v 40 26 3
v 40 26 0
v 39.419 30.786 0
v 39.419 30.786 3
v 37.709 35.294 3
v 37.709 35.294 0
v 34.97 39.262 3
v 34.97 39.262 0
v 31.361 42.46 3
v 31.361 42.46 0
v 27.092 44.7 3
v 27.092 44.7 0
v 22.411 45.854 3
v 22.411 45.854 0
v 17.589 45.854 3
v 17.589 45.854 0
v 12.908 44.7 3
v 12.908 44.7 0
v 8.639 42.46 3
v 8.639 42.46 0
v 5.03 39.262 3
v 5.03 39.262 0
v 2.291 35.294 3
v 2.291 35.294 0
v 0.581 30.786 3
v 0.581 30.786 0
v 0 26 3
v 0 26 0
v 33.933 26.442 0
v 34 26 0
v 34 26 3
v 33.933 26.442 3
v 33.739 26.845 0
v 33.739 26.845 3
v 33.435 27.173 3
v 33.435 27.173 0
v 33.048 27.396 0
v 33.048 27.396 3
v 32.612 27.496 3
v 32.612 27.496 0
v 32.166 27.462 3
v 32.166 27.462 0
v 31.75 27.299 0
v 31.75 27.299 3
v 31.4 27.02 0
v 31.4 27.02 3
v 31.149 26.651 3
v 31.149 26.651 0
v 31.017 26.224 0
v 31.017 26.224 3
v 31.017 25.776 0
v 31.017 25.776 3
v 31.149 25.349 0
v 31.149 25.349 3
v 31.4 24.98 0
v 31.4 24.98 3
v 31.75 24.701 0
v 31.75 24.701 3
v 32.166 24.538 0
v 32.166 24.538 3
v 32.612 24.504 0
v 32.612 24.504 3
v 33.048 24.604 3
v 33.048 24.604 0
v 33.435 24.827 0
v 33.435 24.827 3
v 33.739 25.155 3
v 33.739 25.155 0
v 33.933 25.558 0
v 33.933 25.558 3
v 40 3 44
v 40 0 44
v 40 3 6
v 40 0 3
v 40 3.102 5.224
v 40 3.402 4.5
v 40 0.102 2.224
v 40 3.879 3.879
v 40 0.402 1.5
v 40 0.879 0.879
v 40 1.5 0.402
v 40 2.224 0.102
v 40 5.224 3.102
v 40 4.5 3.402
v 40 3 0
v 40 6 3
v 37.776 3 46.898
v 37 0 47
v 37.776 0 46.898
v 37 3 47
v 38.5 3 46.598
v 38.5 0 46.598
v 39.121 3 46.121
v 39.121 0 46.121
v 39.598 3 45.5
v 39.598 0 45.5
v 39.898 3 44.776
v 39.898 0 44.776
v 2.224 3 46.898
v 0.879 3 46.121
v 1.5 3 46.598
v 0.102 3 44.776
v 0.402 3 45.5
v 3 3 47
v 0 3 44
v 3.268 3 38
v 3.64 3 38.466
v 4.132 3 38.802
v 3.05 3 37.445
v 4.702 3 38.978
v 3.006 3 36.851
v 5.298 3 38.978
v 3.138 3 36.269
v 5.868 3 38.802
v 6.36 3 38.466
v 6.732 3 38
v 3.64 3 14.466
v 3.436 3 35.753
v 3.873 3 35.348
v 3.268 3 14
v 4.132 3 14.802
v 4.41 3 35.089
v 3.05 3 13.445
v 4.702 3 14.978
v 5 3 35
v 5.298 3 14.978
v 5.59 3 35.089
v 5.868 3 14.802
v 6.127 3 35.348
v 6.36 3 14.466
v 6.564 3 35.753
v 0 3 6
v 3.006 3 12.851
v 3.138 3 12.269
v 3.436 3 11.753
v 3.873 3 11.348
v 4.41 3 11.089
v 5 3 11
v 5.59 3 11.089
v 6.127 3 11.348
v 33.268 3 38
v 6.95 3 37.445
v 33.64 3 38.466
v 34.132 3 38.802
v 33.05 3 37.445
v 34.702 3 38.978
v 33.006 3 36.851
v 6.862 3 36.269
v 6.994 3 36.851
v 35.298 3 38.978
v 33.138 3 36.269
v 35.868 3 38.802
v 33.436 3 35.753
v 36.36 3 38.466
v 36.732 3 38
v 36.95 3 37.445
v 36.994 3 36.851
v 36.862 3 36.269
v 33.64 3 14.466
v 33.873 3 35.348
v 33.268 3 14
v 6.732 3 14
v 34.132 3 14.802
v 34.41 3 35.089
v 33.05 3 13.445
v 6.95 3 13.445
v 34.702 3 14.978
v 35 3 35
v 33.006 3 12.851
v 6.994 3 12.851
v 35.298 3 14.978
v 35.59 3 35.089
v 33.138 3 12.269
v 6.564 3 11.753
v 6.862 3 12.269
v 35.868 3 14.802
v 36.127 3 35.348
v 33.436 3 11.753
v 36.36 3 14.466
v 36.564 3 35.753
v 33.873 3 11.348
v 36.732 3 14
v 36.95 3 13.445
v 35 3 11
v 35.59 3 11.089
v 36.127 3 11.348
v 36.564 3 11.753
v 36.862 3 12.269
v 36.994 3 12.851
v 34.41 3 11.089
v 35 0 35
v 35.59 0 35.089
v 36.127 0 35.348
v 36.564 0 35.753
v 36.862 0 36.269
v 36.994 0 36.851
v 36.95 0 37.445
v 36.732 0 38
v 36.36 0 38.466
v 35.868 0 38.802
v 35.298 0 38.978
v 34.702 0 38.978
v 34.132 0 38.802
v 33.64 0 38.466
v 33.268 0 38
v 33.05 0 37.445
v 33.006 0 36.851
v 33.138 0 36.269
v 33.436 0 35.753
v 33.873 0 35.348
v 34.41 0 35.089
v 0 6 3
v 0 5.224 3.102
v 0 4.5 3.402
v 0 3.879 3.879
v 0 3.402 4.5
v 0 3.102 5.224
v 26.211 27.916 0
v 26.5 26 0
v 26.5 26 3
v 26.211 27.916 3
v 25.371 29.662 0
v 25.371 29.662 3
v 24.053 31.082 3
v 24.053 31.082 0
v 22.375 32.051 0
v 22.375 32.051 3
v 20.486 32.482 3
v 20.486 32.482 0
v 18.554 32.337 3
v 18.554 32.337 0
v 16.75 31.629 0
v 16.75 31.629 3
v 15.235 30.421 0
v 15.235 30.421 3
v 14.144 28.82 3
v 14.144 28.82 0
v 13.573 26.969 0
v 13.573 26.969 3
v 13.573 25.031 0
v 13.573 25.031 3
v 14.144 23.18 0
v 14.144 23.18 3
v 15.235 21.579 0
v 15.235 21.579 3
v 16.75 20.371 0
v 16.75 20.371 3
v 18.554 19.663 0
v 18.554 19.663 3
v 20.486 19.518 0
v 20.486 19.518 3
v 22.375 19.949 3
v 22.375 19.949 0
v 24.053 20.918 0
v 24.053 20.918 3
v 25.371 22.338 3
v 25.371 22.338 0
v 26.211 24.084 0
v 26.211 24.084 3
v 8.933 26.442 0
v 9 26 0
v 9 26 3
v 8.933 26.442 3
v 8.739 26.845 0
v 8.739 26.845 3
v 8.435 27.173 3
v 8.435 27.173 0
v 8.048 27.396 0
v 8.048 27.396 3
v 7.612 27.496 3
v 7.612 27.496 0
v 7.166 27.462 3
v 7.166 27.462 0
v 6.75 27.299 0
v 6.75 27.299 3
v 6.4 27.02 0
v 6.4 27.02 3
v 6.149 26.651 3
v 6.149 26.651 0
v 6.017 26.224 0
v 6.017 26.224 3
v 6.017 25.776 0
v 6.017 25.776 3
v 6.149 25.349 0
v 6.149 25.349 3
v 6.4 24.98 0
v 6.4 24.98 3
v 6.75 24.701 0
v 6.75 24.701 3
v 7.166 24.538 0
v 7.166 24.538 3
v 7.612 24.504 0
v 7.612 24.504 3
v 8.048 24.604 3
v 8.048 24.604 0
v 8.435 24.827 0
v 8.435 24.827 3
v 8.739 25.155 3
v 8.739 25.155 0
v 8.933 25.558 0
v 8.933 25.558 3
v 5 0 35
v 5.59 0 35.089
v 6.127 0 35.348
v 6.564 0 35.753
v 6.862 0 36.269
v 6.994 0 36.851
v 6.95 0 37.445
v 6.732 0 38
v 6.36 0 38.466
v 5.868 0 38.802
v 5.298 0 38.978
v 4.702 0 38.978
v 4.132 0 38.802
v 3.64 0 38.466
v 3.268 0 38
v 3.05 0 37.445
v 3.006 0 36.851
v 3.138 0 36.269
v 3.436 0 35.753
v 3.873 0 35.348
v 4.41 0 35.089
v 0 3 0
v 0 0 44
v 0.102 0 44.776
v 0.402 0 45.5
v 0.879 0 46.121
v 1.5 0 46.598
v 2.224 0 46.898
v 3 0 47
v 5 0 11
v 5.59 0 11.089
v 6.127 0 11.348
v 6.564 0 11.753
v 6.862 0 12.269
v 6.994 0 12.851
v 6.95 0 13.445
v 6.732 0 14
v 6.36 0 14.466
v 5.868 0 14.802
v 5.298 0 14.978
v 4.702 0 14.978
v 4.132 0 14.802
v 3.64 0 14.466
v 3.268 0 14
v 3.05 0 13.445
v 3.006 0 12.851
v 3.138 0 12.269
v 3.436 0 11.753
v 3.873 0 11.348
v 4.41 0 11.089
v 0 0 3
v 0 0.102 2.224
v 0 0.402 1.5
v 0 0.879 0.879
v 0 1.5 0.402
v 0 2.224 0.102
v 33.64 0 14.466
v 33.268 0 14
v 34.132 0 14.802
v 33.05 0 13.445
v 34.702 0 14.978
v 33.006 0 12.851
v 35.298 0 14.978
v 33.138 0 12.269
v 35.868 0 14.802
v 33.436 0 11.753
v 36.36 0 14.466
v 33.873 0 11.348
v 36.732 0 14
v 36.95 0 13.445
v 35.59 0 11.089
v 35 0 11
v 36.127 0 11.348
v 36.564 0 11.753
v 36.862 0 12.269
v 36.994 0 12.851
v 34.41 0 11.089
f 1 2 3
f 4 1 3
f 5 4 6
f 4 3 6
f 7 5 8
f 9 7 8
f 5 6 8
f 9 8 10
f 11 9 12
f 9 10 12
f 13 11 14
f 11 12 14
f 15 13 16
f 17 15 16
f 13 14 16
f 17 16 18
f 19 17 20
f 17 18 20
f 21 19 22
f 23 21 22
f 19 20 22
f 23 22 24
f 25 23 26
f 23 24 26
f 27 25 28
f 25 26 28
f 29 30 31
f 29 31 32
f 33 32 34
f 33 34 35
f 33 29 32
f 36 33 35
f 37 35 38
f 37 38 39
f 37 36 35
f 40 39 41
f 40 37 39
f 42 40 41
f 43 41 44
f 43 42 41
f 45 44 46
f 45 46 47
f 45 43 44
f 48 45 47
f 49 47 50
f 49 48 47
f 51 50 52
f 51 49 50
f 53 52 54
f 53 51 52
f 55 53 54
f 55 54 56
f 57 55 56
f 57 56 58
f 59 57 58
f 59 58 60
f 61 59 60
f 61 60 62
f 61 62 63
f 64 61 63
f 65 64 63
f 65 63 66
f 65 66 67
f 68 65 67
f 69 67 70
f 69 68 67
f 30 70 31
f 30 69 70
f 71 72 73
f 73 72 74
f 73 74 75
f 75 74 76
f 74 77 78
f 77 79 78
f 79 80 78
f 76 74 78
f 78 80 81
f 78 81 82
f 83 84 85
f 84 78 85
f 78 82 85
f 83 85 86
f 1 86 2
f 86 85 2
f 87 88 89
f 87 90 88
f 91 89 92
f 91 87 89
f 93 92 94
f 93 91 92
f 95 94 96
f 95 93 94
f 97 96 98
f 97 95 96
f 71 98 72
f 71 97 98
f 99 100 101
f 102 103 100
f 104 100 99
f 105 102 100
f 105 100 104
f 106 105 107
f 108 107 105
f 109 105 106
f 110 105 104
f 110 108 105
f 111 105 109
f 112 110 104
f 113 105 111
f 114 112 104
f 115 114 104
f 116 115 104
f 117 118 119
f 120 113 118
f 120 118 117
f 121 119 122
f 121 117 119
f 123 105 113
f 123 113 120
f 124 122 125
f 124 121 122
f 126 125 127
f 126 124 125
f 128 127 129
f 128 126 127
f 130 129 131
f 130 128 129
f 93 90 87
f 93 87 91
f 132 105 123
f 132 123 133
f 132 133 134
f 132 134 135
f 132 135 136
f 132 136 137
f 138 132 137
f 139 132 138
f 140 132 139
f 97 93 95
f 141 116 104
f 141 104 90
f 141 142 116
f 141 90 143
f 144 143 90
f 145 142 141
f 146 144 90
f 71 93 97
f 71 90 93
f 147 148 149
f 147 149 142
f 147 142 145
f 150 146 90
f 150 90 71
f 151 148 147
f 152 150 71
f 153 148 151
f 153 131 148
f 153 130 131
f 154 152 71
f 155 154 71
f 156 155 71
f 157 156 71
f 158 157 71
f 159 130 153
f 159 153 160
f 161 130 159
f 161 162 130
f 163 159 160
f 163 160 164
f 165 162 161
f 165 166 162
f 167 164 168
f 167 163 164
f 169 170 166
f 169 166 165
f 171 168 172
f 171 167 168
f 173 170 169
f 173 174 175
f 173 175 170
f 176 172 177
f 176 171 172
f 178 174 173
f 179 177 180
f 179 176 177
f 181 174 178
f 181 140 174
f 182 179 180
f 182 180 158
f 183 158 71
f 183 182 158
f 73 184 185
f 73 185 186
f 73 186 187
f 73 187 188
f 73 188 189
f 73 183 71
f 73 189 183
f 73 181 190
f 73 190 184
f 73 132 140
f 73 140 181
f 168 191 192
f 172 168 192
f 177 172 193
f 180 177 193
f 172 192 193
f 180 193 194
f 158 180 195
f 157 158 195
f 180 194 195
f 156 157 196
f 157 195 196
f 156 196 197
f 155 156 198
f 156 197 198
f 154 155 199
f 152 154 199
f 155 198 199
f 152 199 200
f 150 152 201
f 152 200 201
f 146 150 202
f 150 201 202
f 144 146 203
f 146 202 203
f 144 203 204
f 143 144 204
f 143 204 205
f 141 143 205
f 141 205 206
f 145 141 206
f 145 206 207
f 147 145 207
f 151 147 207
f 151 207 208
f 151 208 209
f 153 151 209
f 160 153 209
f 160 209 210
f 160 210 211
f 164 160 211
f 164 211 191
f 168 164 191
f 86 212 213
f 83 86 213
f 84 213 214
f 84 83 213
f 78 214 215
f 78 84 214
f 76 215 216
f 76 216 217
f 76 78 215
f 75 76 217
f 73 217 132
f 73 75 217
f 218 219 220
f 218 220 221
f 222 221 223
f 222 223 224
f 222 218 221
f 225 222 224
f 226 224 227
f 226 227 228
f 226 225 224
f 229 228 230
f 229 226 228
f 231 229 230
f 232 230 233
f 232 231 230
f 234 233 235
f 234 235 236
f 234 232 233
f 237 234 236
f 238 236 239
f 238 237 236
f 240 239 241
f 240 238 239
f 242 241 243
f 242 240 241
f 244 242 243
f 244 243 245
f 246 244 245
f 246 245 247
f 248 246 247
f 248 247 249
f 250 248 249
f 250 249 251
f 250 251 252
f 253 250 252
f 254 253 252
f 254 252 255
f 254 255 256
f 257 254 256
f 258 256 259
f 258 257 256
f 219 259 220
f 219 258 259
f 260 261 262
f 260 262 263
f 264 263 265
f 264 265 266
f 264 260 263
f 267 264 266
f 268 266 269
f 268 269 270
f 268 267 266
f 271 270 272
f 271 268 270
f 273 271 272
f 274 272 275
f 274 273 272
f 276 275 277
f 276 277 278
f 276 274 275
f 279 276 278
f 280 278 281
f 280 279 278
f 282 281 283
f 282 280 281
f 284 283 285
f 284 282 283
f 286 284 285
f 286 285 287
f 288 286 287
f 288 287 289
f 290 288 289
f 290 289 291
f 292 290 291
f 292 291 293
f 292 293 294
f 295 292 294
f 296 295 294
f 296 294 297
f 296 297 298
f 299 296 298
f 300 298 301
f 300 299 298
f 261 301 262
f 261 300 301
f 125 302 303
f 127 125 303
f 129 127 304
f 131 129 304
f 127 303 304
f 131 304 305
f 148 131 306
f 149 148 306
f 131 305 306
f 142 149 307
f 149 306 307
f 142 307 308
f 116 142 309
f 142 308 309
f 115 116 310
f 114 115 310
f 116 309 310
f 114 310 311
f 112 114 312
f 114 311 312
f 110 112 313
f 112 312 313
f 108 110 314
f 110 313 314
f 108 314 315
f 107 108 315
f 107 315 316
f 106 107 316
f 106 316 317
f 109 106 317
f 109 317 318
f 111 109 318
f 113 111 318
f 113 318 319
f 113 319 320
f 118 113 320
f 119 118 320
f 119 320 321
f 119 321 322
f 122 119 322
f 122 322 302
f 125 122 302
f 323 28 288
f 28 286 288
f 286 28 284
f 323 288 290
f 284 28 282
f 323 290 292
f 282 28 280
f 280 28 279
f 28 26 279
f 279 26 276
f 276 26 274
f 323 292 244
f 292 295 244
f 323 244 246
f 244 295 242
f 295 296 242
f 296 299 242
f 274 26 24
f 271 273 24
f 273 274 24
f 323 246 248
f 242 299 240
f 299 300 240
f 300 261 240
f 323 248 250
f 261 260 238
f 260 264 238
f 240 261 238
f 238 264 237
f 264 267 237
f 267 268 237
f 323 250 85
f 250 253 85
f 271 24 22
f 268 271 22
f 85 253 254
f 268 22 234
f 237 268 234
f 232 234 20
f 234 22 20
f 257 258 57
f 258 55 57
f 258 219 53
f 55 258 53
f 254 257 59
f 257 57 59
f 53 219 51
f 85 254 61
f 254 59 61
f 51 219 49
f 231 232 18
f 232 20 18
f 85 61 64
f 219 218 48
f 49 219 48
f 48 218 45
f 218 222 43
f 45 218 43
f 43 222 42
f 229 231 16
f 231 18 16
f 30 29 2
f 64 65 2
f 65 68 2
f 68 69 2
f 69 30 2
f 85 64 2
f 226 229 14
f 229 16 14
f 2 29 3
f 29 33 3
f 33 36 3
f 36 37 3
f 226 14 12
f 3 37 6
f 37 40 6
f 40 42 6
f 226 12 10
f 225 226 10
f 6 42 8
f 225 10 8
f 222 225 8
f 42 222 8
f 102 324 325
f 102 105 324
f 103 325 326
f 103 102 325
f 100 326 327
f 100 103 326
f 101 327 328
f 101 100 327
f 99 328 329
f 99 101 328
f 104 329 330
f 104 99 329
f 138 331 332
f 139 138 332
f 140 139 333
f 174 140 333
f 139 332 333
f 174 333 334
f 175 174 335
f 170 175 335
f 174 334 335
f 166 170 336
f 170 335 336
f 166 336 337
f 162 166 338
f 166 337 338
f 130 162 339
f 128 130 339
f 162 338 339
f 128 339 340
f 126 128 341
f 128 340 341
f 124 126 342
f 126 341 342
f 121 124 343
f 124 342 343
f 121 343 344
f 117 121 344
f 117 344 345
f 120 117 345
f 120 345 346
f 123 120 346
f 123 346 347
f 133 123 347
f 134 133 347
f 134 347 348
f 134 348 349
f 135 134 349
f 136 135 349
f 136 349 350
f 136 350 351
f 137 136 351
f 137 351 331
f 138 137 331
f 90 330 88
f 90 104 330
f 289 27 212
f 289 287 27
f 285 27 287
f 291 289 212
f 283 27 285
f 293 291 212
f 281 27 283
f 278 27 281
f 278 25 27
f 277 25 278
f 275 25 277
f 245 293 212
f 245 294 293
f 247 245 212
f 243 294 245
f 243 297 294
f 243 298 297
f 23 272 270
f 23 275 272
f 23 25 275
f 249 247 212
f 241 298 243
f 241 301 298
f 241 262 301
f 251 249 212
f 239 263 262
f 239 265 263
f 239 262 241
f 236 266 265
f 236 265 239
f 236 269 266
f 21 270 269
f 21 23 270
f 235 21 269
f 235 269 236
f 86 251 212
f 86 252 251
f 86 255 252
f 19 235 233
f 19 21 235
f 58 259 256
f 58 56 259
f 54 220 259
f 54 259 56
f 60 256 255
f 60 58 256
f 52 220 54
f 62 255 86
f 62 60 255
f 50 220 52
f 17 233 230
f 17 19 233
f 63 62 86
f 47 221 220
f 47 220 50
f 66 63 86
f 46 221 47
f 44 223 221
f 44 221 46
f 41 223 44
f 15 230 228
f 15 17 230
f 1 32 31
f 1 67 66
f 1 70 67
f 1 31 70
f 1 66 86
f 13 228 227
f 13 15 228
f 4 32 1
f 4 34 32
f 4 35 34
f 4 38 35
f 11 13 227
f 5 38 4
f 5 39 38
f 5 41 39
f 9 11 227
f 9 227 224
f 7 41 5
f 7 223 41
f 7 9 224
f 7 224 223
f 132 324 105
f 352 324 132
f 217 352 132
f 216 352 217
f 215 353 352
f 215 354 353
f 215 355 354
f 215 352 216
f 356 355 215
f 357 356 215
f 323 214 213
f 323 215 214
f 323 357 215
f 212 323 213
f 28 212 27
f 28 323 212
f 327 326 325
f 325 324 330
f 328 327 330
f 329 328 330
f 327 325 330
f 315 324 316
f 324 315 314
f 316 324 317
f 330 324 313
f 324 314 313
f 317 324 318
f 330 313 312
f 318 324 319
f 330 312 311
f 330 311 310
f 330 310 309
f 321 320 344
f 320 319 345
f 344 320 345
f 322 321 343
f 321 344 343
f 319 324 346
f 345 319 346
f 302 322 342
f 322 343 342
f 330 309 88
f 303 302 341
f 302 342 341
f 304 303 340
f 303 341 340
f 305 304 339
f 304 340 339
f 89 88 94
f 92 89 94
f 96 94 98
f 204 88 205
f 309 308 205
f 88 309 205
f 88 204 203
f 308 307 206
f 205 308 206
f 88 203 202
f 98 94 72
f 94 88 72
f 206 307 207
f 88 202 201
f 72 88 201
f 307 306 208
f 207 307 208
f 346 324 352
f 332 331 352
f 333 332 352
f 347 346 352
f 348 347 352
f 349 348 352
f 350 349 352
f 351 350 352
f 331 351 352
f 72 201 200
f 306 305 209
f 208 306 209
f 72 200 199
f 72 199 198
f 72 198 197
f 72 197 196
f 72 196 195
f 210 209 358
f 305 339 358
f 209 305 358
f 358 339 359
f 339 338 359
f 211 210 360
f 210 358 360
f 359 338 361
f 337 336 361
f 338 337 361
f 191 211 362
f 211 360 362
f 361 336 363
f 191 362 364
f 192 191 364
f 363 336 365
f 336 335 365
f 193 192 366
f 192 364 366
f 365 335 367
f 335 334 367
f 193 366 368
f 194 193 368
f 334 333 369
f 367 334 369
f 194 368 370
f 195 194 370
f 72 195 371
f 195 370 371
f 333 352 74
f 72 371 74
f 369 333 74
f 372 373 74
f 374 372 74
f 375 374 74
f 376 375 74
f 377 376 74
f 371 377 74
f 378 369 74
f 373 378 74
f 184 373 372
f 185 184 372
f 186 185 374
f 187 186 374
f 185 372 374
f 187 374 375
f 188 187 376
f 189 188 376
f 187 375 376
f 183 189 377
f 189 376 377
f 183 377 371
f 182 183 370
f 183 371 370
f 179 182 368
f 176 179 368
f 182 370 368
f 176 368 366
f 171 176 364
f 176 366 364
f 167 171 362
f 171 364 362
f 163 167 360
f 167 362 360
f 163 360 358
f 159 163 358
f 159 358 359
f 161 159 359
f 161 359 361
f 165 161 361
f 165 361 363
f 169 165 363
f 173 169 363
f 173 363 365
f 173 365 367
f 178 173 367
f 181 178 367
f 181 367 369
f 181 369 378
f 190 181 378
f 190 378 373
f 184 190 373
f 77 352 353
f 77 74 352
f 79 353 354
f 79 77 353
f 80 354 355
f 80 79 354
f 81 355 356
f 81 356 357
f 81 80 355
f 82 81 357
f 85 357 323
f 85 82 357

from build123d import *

# Parameters (mm, degrees)
SKETCH_1_R          = 6.5
SKETCH_1_R_2        = 1.5
EXTRUDE_1_DEPTH     = 3
SKETCH_2_W          = 40
SKETCH_2_H          = 3
EXTRUDE_2_DEPTH     = 44
FILLET_4_R          = 3
SKETCH_3_R          = 2
CUT_EXTRUDE_1_DEPTH = 77.974021592
FILLET_5_R          = 3
FILLET_6_R          = 3


with BuildPart() as part:
    # Эскиз1 → Бобышка-Вытянуть1 (new body)
    with BuildSketch(Plane.XY):
        with BuildLine():
            Line((0, 0), (40, 0))
            Line((40, 0), (40, 26))
            ThreePointArc((40, 26), (20, 46), (0, 26))
            Line((0, 26), (0, 0))
        make_face()
        with Locations((20, 26)):
            Circle(SKETCH_1_R, mode=Mode.SUBTRACT)
        with Locations((32.5, 26)):
            Circle(SKETCH_1_R_2, mode=Mode.SUBTRACT)
        with Locations((7.5, 26)):
            Circle(SKETCH_1_R_2, mode=Mode.SUBTRACT)
    extrude(amount=EXTRUDE_1_DEPTH)

    # Эскиз2 → Бобышка-Вытянуть2 (add)
    with BuildSketch(Plane.XY.offset(3)):
        with Locations((20, 1.5)):
            Rectangle(SKETCH_2_W, SKETCH_2_H)
    extrude(amount=EXTRUDE_2_DEPTH)

    # Скругление4
    fillet_4_edges = [part.edges().sort_by_distance(p)[0] for p in [
        (20, 0, 0),
    ]]
    fillet(fillet_4_edges, radius=FILLET_4_R)

    # Эскиз3 → Вырез-Вытянуть1 (cut, through all)
    with BuildSketch(Plane.XZ):
        with Locations(Location((5, 37, 0), (0, 0, 270))):
            Circle(SKETCH_3_R)
        with Locations(Location((35, 37, 0), (0, 0, 270))):
            Circle(SKETCH_3_R)
        with Locations(Location((5, 13, 0), (0, 0, 270))):
            Circle(SKETCH_3_R)
        with Locations(Location((35, 13, 0), (0, 0, 270))):
            Circle(SKETCH_3_R)
    extrude(amount=-CUT_EXTRUDE_1_DEPTH, mode=Mode.SUBTRACT)

    # Скругление5
    fillet_5_edges = [part.edges().sort_by_distance(p)[0] for p in [
        (20, 3, 3),
    ]]
    fillet(fillet_5_edges, radius=FILLET_5_R)

    # Скругление6
    fillet_6_edges = [part.edges().sort_by_distance(p)[0] for p in [
        (40, 1.5, 47),
        (0, 1.5, 47),
    ]]
    fillet(fillet_6_edges, radius=FILLET_6_R)


solid = part.part
